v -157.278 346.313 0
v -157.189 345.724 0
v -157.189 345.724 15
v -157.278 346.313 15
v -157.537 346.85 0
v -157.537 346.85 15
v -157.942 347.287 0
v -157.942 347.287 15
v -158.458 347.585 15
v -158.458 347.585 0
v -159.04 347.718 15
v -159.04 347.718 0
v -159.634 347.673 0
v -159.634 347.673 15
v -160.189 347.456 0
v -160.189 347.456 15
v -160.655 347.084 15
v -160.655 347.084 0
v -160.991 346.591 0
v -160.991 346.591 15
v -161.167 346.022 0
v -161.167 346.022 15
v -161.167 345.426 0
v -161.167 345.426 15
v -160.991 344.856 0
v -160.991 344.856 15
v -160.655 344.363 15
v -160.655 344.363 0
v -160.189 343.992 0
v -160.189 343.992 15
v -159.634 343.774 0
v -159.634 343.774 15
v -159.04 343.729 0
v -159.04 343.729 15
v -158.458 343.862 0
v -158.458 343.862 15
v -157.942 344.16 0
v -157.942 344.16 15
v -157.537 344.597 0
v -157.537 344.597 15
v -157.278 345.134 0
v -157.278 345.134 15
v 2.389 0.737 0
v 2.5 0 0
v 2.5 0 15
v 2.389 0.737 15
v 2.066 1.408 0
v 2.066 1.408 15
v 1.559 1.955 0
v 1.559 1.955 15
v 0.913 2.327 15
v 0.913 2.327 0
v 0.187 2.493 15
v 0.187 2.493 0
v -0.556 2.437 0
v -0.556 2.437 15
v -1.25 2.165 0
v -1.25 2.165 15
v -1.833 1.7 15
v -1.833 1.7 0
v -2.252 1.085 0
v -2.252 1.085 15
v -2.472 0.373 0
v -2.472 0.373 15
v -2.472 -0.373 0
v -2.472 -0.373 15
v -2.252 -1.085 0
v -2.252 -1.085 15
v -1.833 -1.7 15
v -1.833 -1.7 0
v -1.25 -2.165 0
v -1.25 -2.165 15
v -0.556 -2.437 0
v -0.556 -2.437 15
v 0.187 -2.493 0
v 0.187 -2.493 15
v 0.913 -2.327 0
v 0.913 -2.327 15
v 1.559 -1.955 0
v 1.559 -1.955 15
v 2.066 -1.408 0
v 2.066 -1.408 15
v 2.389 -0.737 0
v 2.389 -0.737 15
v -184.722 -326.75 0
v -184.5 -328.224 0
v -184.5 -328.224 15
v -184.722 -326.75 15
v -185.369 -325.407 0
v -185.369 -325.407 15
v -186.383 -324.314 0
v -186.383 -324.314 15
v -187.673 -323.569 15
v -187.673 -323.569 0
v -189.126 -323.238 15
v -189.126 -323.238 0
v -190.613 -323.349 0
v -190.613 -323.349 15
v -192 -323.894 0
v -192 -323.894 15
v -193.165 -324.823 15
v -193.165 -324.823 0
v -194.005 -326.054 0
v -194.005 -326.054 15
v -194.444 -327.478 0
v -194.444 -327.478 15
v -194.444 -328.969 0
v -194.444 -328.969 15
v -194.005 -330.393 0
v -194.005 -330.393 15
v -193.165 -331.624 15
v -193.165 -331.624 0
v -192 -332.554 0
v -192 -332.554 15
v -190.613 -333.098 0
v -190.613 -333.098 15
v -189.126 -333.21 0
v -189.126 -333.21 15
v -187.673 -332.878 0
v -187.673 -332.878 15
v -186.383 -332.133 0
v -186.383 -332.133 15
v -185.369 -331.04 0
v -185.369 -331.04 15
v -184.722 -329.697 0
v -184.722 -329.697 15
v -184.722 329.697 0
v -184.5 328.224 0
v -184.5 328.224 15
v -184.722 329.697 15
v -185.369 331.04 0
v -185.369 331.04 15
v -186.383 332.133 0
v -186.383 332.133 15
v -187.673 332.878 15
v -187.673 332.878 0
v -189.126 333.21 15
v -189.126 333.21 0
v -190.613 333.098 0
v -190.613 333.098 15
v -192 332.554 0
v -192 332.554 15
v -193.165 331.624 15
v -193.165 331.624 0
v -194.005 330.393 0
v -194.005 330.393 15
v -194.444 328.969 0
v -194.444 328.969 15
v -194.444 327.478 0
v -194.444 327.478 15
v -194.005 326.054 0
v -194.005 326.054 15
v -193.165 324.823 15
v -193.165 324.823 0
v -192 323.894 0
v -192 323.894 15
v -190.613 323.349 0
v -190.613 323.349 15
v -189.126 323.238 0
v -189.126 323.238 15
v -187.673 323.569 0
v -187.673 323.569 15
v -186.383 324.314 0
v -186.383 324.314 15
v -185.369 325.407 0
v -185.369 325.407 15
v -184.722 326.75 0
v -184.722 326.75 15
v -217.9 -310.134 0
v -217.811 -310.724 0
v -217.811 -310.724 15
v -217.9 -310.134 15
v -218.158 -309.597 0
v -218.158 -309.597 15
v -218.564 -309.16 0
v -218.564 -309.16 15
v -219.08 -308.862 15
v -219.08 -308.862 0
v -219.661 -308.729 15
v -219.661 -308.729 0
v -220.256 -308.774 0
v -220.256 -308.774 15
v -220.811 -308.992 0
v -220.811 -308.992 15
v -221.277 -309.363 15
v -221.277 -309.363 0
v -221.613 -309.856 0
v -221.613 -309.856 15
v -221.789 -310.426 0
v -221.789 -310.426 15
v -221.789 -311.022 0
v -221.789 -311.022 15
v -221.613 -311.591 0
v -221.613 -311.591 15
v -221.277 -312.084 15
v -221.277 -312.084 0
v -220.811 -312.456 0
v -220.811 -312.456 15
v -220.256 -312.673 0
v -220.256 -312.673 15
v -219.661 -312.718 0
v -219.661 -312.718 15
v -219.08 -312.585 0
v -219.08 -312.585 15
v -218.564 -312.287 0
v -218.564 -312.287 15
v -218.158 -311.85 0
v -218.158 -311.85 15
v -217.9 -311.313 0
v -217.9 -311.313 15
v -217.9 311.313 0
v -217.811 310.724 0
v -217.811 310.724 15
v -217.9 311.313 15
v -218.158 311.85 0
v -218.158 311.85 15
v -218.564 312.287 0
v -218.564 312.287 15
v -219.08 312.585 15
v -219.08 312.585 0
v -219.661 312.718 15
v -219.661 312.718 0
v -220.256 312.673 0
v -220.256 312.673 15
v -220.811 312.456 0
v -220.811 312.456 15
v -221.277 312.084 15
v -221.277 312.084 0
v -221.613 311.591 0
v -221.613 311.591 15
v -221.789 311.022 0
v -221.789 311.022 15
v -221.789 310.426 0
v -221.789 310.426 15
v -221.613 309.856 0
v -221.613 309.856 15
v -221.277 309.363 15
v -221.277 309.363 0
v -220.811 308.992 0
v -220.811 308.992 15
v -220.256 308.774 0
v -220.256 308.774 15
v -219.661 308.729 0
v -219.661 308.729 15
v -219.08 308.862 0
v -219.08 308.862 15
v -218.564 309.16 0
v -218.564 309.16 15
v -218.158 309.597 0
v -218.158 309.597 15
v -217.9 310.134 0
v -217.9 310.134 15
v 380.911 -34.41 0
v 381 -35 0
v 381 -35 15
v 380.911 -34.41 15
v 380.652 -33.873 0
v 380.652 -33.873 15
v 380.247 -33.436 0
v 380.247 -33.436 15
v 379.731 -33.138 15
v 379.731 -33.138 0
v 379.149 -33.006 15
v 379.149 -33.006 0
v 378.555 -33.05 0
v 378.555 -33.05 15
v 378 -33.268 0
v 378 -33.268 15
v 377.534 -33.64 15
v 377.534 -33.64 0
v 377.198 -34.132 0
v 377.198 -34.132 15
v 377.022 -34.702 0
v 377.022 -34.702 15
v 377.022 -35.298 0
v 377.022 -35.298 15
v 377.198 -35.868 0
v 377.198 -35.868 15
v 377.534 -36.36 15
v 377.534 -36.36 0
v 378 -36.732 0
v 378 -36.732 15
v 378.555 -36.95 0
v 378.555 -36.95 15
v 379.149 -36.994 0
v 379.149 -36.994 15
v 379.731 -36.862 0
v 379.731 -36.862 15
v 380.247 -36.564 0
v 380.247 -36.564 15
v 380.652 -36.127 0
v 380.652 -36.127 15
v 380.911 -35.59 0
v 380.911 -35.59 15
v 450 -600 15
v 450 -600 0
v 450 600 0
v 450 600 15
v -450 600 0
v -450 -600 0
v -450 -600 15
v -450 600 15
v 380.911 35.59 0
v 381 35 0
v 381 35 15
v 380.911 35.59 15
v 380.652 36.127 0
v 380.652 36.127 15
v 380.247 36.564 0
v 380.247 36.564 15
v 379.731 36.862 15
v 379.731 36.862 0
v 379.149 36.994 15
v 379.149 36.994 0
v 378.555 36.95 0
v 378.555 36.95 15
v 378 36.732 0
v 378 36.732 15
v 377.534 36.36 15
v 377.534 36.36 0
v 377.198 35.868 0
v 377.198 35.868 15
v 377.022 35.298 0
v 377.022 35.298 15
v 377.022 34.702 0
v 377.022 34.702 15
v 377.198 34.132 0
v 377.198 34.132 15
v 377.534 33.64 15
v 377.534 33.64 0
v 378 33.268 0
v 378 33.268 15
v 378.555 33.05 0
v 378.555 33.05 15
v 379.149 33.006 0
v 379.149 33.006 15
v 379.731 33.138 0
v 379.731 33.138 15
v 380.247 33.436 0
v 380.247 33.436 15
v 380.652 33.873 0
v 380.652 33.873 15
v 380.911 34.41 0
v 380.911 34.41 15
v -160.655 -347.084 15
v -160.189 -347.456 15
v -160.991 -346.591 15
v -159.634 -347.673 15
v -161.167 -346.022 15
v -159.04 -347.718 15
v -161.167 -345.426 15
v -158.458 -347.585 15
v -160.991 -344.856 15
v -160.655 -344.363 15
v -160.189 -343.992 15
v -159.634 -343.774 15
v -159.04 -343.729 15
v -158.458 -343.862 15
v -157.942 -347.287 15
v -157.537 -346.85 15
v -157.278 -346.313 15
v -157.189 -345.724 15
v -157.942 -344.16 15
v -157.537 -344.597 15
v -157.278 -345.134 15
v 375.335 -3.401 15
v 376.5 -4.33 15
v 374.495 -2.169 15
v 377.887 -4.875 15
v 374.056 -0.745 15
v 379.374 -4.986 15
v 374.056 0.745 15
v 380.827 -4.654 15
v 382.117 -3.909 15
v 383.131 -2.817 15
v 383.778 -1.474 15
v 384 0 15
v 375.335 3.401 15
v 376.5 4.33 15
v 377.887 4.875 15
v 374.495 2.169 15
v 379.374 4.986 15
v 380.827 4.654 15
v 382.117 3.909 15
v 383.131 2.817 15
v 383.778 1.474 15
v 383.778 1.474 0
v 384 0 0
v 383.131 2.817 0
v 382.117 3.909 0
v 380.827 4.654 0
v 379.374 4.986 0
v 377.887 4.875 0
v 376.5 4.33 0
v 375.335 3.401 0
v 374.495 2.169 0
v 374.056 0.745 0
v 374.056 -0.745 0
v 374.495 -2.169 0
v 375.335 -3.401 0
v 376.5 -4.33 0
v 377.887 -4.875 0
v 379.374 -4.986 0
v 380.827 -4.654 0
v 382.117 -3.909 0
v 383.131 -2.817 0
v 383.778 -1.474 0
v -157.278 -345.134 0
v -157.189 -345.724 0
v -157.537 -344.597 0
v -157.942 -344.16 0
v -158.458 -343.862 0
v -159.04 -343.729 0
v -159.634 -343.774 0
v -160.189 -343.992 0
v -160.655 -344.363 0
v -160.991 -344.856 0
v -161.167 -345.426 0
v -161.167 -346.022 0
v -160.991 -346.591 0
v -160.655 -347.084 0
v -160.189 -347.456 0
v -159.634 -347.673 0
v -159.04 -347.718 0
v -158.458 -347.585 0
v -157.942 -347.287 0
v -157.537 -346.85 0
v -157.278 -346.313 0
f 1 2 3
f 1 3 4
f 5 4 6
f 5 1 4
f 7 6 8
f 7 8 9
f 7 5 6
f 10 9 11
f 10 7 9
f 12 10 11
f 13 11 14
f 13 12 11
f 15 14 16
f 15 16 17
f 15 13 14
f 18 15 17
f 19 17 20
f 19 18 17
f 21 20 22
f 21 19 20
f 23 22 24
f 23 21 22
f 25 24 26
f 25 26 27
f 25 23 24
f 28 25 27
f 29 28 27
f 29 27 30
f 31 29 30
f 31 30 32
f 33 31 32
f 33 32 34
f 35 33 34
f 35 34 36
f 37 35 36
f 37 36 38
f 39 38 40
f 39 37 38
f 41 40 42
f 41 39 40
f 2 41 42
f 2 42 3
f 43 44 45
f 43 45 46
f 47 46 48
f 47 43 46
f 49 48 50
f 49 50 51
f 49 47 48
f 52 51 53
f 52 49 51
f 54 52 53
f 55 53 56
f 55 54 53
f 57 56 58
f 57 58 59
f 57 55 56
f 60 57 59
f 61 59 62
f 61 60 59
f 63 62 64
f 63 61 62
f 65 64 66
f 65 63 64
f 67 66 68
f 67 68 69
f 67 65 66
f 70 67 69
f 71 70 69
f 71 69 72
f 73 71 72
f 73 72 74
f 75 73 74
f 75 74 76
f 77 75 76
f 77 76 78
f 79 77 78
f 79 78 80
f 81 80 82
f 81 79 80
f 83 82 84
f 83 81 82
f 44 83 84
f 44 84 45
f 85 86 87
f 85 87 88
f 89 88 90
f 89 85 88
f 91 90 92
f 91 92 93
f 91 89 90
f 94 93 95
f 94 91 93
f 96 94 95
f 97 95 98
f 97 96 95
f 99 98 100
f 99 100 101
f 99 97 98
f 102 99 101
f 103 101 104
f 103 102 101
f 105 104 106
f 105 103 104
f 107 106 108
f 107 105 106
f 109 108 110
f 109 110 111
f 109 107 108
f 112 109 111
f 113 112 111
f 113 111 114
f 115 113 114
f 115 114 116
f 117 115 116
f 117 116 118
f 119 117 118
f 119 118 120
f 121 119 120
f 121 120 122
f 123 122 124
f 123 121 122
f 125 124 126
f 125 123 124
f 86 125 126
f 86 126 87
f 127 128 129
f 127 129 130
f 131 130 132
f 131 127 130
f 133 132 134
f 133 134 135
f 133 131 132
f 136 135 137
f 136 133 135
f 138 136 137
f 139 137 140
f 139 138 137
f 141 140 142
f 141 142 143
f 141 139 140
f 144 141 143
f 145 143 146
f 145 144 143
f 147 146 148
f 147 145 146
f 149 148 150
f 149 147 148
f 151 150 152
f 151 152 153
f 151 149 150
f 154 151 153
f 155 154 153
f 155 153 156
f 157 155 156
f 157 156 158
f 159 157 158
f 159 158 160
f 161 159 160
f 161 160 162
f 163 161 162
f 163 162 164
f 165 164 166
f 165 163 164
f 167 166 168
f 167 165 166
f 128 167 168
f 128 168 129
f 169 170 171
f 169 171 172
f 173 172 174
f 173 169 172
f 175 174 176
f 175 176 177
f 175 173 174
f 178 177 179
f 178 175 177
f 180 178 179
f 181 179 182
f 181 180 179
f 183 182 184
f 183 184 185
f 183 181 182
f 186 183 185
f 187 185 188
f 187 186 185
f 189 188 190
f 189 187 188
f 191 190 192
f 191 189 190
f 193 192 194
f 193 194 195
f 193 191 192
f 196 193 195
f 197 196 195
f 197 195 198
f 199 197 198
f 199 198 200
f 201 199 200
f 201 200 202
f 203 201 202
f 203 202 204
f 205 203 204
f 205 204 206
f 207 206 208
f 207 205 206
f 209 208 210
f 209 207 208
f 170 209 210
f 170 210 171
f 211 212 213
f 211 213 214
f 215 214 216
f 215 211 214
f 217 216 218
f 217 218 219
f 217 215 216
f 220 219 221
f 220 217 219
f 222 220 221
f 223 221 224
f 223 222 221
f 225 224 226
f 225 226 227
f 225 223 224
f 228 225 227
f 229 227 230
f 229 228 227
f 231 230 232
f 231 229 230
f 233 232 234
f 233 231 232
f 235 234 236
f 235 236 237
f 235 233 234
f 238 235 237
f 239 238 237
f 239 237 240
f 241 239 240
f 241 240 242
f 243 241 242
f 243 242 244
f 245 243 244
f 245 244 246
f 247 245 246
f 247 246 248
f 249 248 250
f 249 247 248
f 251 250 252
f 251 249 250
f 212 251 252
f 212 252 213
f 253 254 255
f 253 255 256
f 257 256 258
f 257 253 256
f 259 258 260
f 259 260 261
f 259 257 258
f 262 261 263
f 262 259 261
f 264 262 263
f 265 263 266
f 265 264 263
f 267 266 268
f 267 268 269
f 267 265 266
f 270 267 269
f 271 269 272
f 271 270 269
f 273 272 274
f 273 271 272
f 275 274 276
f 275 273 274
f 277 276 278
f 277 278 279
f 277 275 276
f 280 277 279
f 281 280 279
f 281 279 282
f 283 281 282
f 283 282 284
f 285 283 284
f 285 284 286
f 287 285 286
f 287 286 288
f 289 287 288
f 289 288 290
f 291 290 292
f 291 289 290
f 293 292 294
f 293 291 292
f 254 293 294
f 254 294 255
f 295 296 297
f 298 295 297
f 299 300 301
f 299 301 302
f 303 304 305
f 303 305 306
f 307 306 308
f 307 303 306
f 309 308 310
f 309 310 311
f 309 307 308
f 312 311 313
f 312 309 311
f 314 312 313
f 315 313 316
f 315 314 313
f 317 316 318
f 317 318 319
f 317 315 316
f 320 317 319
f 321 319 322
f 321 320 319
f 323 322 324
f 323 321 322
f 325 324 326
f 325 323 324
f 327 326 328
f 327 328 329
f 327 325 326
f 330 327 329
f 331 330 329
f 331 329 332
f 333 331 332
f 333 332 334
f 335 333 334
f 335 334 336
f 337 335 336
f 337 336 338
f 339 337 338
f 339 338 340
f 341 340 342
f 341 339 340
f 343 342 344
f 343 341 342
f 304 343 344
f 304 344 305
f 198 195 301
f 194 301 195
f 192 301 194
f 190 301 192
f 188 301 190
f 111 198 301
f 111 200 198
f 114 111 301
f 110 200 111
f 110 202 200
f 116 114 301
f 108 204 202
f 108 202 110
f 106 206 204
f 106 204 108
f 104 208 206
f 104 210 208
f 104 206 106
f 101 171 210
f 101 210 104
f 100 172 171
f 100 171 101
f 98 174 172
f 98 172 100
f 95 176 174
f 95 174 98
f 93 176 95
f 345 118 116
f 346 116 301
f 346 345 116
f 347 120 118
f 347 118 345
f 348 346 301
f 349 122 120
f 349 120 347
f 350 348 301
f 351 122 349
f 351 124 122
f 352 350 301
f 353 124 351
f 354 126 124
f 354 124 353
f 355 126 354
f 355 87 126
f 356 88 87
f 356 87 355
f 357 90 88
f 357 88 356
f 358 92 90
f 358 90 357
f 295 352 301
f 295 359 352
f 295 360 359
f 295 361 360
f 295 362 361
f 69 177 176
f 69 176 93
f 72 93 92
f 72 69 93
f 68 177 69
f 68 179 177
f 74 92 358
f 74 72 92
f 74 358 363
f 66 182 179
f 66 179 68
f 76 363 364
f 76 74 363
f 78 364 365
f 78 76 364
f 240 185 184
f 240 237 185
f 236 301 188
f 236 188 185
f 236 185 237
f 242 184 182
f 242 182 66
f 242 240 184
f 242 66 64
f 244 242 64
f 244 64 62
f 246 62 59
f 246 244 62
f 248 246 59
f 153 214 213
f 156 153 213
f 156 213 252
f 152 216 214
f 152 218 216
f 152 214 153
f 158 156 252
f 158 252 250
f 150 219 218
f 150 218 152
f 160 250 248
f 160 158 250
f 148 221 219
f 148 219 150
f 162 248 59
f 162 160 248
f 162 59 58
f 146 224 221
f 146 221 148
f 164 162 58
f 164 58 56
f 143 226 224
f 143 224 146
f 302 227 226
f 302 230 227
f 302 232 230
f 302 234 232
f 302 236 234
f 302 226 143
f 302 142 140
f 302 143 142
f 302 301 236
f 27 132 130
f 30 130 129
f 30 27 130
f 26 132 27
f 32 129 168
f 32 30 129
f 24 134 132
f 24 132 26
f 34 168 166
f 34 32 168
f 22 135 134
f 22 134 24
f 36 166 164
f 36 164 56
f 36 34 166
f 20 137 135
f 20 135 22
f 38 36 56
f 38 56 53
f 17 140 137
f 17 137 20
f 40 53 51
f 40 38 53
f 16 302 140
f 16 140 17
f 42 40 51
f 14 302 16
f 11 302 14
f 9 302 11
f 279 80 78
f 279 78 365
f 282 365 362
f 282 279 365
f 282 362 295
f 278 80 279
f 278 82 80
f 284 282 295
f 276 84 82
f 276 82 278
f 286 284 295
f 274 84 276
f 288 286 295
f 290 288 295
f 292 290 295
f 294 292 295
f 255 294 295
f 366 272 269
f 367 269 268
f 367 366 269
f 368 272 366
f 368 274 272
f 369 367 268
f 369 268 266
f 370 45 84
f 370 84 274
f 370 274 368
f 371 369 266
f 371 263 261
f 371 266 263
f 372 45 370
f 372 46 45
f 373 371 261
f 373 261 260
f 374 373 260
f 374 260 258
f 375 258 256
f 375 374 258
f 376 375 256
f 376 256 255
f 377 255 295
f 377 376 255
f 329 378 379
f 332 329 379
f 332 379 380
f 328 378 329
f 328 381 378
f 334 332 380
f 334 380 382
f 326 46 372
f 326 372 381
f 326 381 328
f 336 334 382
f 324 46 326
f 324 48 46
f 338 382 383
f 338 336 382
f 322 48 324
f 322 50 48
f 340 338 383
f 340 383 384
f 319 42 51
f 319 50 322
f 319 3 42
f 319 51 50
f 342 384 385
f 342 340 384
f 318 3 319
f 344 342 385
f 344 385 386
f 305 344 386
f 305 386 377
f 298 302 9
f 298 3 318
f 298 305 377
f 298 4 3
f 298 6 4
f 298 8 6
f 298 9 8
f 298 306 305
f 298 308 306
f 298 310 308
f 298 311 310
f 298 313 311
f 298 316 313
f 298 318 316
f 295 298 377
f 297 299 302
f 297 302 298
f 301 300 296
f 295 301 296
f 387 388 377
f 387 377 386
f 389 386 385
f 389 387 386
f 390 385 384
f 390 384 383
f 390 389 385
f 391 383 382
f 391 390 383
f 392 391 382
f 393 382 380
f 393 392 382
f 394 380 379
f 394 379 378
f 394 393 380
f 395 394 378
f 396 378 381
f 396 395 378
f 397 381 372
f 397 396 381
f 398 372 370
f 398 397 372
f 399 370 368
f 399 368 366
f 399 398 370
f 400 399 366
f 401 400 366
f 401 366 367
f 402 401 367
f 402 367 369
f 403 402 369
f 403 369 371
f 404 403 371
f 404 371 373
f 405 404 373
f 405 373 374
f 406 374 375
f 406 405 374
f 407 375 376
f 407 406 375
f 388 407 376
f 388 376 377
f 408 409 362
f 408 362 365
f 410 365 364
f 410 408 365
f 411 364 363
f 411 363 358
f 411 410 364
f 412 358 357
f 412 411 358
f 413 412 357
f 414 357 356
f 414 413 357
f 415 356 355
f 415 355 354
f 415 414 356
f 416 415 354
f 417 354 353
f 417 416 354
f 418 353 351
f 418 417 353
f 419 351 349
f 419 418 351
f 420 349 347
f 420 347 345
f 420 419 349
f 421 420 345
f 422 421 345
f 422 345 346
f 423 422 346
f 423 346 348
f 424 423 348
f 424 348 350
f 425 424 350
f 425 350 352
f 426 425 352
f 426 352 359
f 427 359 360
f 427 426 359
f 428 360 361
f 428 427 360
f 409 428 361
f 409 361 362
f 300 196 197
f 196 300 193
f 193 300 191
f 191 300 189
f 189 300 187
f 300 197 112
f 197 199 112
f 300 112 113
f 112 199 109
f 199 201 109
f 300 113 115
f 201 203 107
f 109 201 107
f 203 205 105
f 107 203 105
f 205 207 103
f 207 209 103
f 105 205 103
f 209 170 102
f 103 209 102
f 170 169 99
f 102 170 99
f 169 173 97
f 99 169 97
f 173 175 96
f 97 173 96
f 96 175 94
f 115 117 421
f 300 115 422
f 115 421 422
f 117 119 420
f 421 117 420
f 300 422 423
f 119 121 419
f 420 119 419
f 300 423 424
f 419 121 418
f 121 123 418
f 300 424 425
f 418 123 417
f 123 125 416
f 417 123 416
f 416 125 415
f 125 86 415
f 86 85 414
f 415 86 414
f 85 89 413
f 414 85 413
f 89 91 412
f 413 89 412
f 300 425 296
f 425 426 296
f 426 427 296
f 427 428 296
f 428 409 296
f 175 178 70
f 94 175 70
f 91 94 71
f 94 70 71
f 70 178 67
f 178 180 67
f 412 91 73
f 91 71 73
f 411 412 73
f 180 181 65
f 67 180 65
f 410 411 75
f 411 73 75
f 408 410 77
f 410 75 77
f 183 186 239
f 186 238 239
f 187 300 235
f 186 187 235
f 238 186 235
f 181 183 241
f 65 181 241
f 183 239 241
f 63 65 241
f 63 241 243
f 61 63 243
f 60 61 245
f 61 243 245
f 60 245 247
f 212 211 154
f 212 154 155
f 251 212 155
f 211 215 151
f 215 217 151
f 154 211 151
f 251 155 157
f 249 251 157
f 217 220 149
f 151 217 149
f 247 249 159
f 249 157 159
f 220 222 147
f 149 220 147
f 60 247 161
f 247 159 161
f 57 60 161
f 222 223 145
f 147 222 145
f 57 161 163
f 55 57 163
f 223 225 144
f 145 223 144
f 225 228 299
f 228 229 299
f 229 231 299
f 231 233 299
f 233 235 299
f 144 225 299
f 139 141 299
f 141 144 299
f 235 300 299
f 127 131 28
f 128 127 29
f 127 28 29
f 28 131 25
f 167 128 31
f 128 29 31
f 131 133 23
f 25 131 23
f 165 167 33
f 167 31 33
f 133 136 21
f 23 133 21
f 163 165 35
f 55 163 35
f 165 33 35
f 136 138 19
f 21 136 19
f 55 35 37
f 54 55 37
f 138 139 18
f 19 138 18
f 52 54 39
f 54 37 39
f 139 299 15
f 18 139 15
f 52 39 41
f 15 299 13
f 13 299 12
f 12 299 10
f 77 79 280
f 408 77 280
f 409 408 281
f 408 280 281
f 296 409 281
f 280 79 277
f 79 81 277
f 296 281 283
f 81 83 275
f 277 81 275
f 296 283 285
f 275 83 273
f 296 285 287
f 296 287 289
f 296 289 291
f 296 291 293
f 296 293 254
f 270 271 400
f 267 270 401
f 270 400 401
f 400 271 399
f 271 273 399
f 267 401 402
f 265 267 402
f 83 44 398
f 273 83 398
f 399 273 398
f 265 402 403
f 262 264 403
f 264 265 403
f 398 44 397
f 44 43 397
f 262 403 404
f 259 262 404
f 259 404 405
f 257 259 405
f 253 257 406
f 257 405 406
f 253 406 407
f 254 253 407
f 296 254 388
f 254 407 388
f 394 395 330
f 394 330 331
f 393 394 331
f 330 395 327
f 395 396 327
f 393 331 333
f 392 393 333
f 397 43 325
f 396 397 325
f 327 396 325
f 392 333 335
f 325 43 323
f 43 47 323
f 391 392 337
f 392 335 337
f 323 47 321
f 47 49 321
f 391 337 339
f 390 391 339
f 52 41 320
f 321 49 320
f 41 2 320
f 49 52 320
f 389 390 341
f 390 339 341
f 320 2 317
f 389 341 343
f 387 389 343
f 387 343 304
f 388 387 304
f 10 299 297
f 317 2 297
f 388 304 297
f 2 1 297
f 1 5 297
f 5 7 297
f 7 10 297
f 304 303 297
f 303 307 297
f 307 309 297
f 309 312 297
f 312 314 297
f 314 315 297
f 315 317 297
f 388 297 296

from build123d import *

# Parameters (mm, degrees)
ESQUISSE1_W        = 900
ESQUISSE1_H        = 1200
ESQUISSE1_R        = 5
ESQUISSE1_R_2      = 2
ESQUISSE1_R_3      = 2.5
BOSS_EXTRU_1_DEPTH = 15


with BuildPart() as part:
    # Esquisse1 → Boss.-Extru.1 (new body)
    with BuildSketch(Plane.XY):
        Rectangle(ESQUISSE1_W, ESQUISSE1_H)
        with Locations((379, 0)):
            Circle(ESQUISSE1_R, mode=Mode.SUBTRACT)
        with Locations((379, 35)):
            Circle(ESQUISSE1_R_2, mode=Mode.SUBTRACT)
        with Locations((379, -35)):
            Circle(ESQUISSE1_R_2, mode=Mode.SUBTRACT)
        with Locations((-189.5, -328.223628034)):
            Circle(ESQUISSE1_R, mode=Mode.SUBTRACT)
        with Locations((-159.189110868, -345.723628034)):
            Circle(ESQUISSE1_R_2, mode=Mode.SUBTRACT)
        with Locations((-219.810889132, -310.723628034)):
            Circle(ESQUISSE1_R_2, mode=Mode.SUBTRACT)
        with Locations((-189.5, 328.223628034)):
            Circle(ESQUISSE1_R, mode=Mode.SUBTRACT)
        with Locations((-219.810889132, 310.723628034)):
            Circle(ESQUISSE1_R_2, mode=Mode.SUBTRACT)
        with Locations((-159.189110868, 345.723628034)):
            Circle(ESQUISSE1_R_2, mode=Mode.SUBTRACT)
        Circle(ESQUISSE1_R_3, mode=Mode.SUBTRACT)
    extrude(amount=BOSS_EXTRU_1_DEPTH)


solid = part.part
